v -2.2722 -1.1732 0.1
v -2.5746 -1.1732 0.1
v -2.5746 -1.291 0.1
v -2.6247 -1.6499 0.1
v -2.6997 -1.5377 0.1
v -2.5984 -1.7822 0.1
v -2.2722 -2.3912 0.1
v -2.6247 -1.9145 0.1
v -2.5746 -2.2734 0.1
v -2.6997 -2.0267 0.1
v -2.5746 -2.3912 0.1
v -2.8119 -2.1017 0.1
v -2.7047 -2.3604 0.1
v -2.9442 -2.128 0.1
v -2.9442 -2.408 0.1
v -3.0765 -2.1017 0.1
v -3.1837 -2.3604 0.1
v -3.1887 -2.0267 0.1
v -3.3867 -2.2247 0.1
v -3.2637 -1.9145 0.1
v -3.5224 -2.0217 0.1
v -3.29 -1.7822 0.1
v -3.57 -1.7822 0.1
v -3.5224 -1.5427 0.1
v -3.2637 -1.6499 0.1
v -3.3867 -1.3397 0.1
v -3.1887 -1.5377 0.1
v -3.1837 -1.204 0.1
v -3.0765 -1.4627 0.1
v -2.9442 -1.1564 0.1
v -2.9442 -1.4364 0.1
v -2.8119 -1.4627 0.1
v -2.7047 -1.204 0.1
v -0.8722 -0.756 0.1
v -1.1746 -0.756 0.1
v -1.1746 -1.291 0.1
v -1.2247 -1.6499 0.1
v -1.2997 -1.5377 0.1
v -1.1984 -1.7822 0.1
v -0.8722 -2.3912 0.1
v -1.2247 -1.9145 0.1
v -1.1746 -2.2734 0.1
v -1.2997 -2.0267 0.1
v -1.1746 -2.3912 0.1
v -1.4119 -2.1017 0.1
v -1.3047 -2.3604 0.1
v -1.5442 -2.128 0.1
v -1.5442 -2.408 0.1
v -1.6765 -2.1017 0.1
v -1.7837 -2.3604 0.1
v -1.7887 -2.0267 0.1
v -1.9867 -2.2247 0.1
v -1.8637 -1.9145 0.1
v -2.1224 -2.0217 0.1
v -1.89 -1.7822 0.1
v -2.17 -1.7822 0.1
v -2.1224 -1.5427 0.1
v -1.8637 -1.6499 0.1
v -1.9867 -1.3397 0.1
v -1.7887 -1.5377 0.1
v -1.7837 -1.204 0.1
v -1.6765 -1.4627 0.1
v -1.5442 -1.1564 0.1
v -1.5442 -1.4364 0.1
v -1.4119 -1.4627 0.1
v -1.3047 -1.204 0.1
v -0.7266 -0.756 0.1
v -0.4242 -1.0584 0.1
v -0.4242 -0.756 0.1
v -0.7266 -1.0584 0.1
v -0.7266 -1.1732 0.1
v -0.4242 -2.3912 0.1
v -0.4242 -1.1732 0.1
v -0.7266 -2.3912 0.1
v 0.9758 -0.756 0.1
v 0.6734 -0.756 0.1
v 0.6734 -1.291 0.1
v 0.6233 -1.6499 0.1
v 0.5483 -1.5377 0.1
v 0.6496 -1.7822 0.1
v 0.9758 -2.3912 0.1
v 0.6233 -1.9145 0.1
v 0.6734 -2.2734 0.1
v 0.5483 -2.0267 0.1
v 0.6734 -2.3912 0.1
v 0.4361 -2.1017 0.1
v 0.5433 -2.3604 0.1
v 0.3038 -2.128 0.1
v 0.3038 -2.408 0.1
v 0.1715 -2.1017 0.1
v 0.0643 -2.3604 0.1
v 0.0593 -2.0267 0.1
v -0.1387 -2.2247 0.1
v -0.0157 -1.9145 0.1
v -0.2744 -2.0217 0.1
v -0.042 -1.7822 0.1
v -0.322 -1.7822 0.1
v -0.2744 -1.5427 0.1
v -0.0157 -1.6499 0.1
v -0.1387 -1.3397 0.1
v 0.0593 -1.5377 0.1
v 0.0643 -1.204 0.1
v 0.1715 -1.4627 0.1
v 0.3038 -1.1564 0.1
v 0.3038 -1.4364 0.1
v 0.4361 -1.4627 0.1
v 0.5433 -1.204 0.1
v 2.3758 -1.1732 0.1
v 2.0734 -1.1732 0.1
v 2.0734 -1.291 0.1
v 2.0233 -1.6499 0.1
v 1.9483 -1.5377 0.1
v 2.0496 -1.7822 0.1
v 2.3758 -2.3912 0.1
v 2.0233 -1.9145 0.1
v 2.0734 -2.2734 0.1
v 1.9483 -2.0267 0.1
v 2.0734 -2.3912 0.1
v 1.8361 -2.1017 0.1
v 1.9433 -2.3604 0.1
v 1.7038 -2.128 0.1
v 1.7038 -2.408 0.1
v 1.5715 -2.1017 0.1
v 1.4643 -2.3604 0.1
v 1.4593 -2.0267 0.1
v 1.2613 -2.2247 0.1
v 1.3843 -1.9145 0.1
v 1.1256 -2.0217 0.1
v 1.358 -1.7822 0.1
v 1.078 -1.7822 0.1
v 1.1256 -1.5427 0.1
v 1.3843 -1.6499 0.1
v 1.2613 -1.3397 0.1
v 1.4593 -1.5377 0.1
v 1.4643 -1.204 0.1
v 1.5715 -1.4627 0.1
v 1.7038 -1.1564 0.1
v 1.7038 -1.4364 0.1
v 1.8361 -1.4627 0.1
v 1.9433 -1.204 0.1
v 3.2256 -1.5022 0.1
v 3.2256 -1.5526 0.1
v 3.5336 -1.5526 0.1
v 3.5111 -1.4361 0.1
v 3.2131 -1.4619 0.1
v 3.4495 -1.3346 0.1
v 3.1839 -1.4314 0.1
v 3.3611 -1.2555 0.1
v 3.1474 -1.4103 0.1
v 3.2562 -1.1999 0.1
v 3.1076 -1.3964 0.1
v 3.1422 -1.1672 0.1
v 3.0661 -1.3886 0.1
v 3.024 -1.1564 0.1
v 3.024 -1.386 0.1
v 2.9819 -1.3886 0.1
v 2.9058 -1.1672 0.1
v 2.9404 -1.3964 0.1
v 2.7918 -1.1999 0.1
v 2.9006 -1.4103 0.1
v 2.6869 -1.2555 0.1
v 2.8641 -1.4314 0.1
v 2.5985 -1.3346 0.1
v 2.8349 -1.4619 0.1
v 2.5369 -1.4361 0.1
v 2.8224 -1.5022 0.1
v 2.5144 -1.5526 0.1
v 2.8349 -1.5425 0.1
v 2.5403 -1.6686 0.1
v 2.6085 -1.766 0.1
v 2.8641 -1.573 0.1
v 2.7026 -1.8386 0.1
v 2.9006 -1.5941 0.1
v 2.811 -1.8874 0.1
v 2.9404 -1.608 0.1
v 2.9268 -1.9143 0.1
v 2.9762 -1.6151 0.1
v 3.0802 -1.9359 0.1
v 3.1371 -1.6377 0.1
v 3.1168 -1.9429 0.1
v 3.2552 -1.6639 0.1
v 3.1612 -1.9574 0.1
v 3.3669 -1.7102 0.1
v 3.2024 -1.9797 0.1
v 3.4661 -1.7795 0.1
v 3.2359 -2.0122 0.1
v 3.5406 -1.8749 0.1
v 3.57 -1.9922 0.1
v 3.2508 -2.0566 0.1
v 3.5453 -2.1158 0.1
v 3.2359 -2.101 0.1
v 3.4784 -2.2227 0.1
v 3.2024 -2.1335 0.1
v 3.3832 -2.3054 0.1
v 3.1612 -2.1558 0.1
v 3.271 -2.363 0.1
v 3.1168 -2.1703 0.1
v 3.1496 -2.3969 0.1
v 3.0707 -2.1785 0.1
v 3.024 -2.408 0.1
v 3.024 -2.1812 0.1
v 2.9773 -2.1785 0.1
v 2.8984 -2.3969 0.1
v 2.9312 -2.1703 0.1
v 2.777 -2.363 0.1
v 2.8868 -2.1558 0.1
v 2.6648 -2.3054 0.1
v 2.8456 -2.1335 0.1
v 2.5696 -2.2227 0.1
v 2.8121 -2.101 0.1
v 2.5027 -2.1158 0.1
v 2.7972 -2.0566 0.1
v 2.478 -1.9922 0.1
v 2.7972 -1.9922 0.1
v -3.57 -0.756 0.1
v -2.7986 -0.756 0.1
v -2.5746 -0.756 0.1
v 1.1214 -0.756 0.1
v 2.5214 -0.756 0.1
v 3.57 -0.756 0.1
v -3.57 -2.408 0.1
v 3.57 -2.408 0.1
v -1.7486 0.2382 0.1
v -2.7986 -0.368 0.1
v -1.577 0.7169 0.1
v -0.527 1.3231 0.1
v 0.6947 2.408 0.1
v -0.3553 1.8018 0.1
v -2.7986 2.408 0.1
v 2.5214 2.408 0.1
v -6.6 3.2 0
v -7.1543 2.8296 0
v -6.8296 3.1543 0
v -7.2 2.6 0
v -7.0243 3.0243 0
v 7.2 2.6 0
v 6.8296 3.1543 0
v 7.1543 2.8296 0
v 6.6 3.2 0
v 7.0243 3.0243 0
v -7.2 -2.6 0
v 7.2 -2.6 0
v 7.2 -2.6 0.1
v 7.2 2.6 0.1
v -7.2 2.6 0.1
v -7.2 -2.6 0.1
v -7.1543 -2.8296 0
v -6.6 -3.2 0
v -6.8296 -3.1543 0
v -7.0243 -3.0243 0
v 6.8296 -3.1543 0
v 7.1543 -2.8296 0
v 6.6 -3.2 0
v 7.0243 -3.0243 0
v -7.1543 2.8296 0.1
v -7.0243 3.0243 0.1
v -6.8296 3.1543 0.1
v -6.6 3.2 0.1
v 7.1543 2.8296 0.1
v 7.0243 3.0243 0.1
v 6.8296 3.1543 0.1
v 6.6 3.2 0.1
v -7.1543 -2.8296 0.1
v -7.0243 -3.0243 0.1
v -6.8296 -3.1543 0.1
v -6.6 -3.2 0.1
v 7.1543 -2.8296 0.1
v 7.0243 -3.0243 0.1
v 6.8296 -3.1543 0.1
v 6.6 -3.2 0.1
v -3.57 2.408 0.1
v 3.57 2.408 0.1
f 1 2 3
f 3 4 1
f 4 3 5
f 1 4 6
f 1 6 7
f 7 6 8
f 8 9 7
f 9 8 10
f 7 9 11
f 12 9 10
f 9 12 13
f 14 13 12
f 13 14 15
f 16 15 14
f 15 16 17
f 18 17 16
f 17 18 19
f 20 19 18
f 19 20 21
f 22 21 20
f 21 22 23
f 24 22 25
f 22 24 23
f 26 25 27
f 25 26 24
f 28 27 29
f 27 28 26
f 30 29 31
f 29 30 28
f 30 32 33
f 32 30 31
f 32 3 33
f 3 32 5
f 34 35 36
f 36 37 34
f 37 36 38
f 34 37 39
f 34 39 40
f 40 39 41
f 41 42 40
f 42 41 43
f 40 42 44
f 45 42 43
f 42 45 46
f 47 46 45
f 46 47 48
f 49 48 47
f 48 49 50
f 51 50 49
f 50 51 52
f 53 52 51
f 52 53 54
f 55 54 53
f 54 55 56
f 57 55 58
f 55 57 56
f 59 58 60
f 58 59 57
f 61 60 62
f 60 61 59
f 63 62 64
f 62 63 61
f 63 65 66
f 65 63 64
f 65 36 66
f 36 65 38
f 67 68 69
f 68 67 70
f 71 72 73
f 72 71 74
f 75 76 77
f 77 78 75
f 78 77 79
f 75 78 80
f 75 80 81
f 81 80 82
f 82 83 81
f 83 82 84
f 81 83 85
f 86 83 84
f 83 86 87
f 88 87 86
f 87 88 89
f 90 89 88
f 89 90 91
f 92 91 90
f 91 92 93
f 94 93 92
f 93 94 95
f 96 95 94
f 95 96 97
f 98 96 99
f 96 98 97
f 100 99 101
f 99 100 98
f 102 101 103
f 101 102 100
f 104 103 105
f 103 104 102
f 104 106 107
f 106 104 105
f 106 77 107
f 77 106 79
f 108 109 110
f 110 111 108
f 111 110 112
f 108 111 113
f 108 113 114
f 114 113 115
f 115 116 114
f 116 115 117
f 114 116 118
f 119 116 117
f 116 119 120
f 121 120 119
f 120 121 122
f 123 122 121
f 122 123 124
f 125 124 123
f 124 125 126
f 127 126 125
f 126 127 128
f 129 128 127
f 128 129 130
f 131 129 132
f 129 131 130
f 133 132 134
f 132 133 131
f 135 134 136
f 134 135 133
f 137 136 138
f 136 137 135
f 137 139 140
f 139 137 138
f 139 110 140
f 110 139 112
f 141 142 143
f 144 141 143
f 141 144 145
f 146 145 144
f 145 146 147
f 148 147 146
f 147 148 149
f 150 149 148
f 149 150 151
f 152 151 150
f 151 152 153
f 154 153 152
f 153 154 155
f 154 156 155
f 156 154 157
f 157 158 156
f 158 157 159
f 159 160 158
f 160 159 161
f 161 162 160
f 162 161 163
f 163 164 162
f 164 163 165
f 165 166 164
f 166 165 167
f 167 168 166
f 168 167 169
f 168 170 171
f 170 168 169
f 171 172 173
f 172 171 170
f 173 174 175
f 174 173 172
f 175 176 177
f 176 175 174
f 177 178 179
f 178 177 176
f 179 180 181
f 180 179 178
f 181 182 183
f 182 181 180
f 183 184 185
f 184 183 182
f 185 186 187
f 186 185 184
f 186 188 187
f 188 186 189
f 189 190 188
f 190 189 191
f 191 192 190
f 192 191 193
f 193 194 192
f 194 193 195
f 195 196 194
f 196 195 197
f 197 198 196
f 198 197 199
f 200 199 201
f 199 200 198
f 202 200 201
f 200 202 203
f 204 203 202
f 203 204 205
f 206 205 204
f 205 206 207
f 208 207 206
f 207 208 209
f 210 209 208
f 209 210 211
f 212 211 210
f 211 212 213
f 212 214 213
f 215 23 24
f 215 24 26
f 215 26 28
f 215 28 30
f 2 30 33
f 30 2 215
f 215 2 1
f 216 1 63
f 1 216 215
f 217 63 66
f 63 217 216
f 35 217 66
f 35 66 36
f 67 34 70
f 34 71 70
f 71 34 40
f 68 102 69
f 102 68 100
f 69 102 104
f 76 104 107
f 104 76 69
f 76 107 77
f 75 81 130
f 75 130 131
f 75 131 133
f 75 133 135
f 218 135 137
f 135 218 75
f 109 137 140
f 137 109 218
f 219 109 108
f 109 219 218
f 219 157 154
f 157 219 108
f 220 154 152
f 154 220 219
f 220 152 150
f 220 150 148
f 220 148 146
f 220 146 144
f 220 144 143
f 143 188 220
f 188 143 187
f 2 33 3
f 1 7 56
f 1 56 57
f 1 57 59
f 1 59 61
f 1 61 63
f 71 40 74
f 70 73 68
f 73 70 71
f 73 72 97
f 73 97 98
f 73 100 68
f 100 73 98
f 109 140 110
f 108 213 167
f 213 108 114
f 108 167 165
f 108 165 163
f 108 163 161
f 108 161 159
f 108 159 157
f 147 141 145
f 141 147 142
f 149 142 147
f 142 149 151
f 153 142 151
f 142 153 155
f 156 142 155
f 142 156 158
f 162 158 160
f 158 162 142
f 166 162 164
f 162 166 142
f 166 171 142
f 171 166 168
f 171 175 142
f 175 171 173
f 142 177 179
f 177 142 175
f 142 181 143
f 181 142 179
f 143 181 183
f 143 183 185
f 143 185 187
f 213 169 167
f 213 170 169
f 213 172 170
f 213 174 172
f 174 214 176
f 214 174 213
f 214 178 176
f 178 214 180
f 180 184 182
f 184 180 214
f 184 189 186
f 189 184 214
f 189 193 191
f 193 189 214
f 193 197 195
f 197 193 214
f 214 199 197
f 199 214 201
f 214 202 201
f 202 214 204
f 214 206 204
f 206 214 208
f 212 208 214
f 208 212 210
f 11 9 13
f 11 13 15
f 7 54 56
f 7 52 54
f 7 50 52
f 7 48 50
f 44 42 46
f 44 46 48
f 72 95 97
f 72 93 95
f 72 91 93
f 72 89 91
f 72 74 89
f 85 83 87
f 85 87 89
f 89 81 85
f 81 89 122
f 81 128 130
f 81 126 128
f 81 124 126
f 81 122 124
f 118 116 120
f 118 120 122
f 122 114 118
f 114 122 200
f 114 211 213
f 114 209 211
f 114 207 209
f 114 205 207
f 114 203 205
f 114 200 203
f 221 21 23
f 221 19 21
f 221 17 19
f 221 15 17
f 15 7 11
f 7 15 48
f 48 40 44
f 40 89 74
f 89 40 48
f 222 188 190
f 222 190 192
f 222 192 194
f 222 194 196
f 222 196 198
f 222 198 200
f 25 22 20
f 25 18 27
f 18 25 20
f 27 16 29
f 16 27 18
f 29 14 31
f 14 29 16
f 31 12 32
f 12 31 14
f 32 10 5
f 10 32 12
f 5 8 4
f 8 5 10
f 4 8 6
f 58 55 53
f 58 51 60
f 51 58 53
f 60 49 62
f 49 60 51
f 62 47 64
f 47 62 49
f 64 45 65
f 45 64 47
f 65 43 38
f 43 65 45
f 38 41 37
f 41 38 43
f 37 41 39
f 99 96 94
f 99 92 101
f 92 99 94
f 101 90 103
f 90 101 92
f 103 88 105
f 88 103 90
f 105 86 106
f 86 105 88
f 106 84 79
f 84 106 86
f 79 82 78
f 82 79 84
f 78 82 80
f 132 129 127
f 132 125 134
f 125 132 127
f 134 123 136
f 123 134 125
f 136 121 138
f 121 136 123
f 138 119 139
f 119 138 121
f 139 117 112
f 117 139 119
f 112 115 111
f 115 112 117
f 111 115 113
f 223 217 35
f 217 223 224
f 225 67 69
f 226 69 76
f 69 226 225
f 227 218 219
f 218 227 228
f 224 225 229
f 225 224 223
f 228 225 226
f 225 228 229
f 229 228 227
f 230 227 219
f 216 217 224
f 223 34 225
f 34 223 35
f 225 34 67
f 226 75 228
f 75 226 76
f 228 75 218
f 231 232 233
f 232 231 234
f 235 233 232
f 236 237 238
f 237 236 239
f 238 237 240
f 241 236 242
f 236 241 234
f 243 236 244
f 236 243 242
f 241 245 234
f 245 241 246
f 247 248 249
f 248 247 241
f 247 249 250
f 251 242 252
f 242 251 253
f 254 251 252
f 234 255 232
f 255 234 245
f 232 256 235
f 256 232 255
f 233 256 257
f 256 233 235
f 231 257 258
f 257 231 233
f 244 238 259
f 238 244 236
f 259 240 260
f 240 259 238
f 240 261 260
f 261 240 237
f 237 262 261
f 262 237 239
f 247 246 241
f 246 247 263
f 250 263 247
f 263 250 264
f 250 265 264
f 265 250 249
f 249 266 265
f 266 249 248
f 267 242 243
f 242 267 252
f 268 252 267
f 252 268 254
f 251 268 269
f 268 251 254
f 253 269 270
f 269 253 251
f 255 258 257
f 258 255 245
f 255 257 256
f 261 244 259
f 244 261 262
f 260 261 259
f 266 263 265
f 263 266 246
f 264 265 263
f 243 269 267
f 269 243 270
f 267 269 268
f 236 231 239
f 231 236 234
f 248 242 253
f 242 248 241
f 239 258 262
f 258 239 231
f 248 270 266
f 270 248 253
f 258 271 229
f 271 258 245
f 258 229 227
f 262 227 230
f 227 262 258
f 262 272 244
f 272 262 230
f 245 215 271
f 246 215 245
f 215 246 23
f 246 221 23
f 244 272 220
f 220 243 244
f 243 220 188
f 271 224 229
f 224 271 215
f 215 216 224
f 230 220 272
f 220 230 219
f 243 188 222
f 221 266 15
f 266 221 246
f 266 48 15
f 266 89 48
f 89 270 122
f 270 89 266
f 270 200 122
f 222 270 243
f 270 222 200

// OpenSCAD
// file: ../p/logo-adidas.scad
use <../lib.scad>
function ldraw_lib__logo_adidas() = [
// 0 Logo Adidas Stripes
// 0 Name: logo-adidas.dat
// 0 Author: Massimo Maso [Sirio]
// 0 !LDRAW_ORG Primitive UPDATE 2024-09
// 0 !LICENSE Licensed under CC BY 4.0 : see CAreadme.txt
// 
// 0 !HELP Exact dimensions X = 19; Z = 11.3
// 
// 0 BFC CERTIFY CCW
  [0,"BFC","CERTIFY"],
  [0,"BFC","CCW"],
// 
// 0 !HISTORY 2024-10-27 [OrionP] Official Update 2024-09
// 
// 
// 0 // Faces
// 4 16 -9.5 0 -4.2643 -8.7 0 -5.65 -3.7 0 -5.65 -5.75 0 -2.0993
  [4,16,-9.5,0,-4.2643,-8.7,0,-5.65,-3.7,0,-5.65,-5.75,0,-2.0993],
// 3 16 -5.137 0 -.3897 -2.1 0 -5.65 -1.02 0 -5.65
  [3,16,-5.137,0,-.3897,-2.1,0,-5.65,-1.02,0,-5.65],
// 4 16 -5.137 0 -.3897 -1.02 0 -5.65 2.9 0 -5.65 -1.387 0 1.7754
  [4,16,-5.137,0,-.3897,-1.02,0,-5.65,2.9,0,-5.65,-1.387,0,1.7754],
// 4 16 -.774 0 3.4849 4.5 0 -5.65 9.5 0 -5.65 2.976 0 5.65
  [4,16,-.774,0,3.4849,4.5,0,-5.65,9.5,0,-5.65,2.976,0,5.65],
];
module ldraw_lib__logo_adidas(step=0, col=false, unit=2/5, alt=false, line=0.2, solid=!$preview)
    makepoly(ldraw_lib__logo_adidas(), step=step, col=col, unit=unit, alt=alt, line=line, solid=solid);
ldraw_lib__logo_adidas(line=0.2);
// file: ../p/logo-adidas-box.scad
use <../lib.scad>
function ldraw_lib__logo_adidas_box() = [
// 0 Logo Adidas Stripes - Outer Box
// 0 Name: logo-adidas-box.dat
// 0 Author: Massimo Maso [Sirio]
// 0 !LDRAW_ORG Primitive UPDATE 2024-09
// 0 !LICENSE Licensed under CC BY 4.0 : see CAreadme.txt
// 
// 0 !HELP Exact dimensions X = 19; Z = 11.3
// 
// 0 BFC CERTIFY CCW
  [0,"BFC","CERTIFY"],
  [0,"BFC","CCW"],
// 
// 0 !HISTORY 2024-10-27 [OrionP] Official Update 2024-09
// 
// 
// 0 // Faces
// 4 16 -9.5 0 5.65 -9.5 0 -4.2643 -5.75 0 -2.0993 -5.137 0 -.3897
  [4,16,-9.5,0,5.65,-9.5,0,-4.2643,-5.75,0,-2.0993,-5.137,0,-.3897],
// 4 16 -9.5 0 5.65 -5.137 0 -.3897 -1.387 0 1.7754 -.774 0 3.4849
  [4,16,-9.5,0,5.65,-5.137,0,-.3897,-1.387,0,1.7754,-.774,0,3.4849],
// 3 16 -9.5 0 5.65 -.774 0 3.4849 2.976 0 5.65
  [3,16,-9.5,0,5.65,-.774,0,3.4849,2.976,0,5.65],
// 3 16 9.5 0 5.65 2.976 0 5.65 9.5 0 -5.65
  [3,16,9.5,0,5.65,2.976,0,5.65,9.5,0,-5.65],
// 3 16 -9.5 0 -5.65 -8.7 0 -5.65 -9.5 0 -4.2643
  [3,16,-9.5,0,-5.65,-8.7,0,-5.65,-9.5,0,-4.2643],
// 4 16 -5.137 0 -.3897 -5.75 0 -2.0993 -3.7 0 -5.65 -2.62 0 -5.65
  [4,16,-5.137,0,-.3897,-5.75,0,-2.0993,-3.7,0,-5.65,-2.62,0,-5.65],
// 3 16 -5.137 0 -.3897 -2.62 0 -5.65 -2.1 0 -5.65
  [3,16,-5.137,0,-.3897,-2.62,0,-5.65,-2.1,0,-5.65],
// 4 16 -.774 0 3.4849 -1.387 0 1.7754 2.9 0 -5.65 3.98 0 -5.65
  [4,16,-.774,0,3.4849,-1.387,0,1.7754,2.9,0,-5.65,3.98,0,-5.65],
// 3 16 -.774 0 3.4849 3.98 0 -5.65 4.5 0 -5.65
  [3,16,-.774,0,3.4849,3.98,0,-5.65,4.5,0,-5.65],
];
module ldraw_lib__logo_adidas_box(step=0, col=false, unit=2/5, alt=false, line=0.2, solid=!$preview)
    makepoly(ldraw_lib__logo_adidas_box(), step=step, col=col, unit=unit, alt=alt, line=line, solid=solid);
ldraw_lib__logo_adidas_box(line=0.2);
// file: ../p/box3u12.scad
use <../lib.scad>
function ldraw_lib__box3u12() = [
// 0 Box with 3 Parallel Faces without Any Edges
// 0 Name: box3u12.dat
// 0 Author: J.C. Tchang [tchang]
// 0 !LDRAW_ORG Primitive UPDATE 2014-02
// 0 !LICENSE Licensed under CC BY 4.0 : see CAreadme.txt
// 
// 0 BFC CERTIFY CCW
  [0,"BFC","CERTIFY"],
  [0,"BFC","CCW"],
// 
// 0 !HISTORY 2014-12-23 [PTadmin] Official Update 2014-02
// 
// 
// 4 16 -1 1 1 1 1 1 1 1 -1 -1 1 -1
  [4,16,-1,1,1,1,1,1,1,1,-1,-1,1,-1],
// 4 16 -1 1 1 -1 0 1 1 0 1 1 1 1
  [4,16,-1,1,1,-1,0,1,1,0,1,1,1,1],
// 4 16 1 1 -1 1 0 -1 -1 0 -1 -1 1 -1
  [4,16,1,1,-1,1,0,-1,-1,0,-1,-1,1,-1],
];
module ldraw_lib__box3u12(step=0, col=false, unit=2/5, alt=false, line=0.2, solid=!$preview)
    makepoly(ldraw_lib__box3u12(), step=step, col=col, unit=unit, alt=alt, line=line, solid=solid);
ldraw_lib__box3u12(line=0.2);
// file: ../p/1-4cyli.scad
use <../lib.scad>
function ldraw_lib__1_4cyli() = [
// 0 Cylinder 0.25
// 0 Name: 1-4cyli.dat
// 0 Author: James Jessiman
// 0 !LDRAW_ORG Primitive UPDATE 2012-01
// 0 !LICENSE Licensed under CC BY 4.0 : see CAreadme.txt
// 
// 0 BFC CERTIFY CCW
  [0,"BFC","CERTIFY"],
  [0,"BFC","CCW"],
// 
// 0 !HISTORY 2002-03-23 [sbliss] Added BFC statement.
// 0 !HISTORY 2002-04-25 [PTadmin] Official Update 2002-02
// 0 !HISTORY 2007-06-22 [PTadmin] Header formatted for Contributor Agreement
// 0 !HISTORY 2008-07-01 [PTadmin] Official Update 2008-01
// 0 !HISTORY 2012-02-16 [Philo] Changed to CCW
// 0 !HISTORY 2012-03-30 [PTadmin] Official Update 2012-01
// 
// 
// 4 16 1 1 0 0.9239 1 0.3827 0.9239 0 0.3827 1 0 0
  [4,16,1,1,0,0.9239,1,0.3827,0.9239,0,0.3827,1,0,0],
// 5 24 1 0 0 1 1 0 0.9239 0 0.3827 1 0 -1
  [5,24,1,0,0,1,1,0,0.9239,0,0.3827,1,0,-1],
// 4 16 0.9239 1 0.3827 0.7071 1 0.7071 0.7071 0 0.7071 0.9239 0 0.3827
  [4,16,0.9239,1,0.3827,0.7071,1,0.7071,0.7071,0,0.7071,0.9239,0,0.3827],
// 5 24 0.9239 0 0.3827 0.9239 1 0.3827 0.7071 0 0.7071 1 0 0
  [5,24,0.9239,0,0.3827,0.9239,1,0.3827,0.7071,0,0.7071,1,0,0],
// 4 16 0.7071 1 0.7071 0.3827 1 0.9239 0.3827 0 0.9239 0.7071 0 0.7071
  [4,16,0.7071,1,0.7071,0.3827,1,0.9239,0.3827,0,0.9239,0.7071,0,0.7071],
// 5 24 0.7071 0 0.7071 0.7071 1 0.7071 0.3827 0 0.9239 0.9239 0 0.3827
  [5,24,0.7071,0,0.7071,0.7071,1,0.7071,0.3827,0,0.9239,0.9239,0,0.3827],
// 4 16 0.3827 1 0.9239 0 1 1 0 0 1 0.3827 0 0.9239
  [4,16,0.3827,1,0.9239,0,1,1,0,0,1,0.3827,0,0.9239],
// 5 24 0.3827 0 0.9239 0.3827 1 0.9239 0 0 1 0.7071 0 0.7071
  [5,24,0.3827,0,0.9239,0.3827,1,0.9239,0,0,1,0.7071,0,0.7071],
// 5 24 0 0 1 0 1 1 0.3827 0 0.9239 -1 0 1
  [5,24,0,0,1,0,1,1,0.3827,0,0.9239,-1,0,1],
];
module ldraw_lib__1_4cyli(step=0, col=false, unit=2/5, alt=false, line=0.2, solid=!$preview)
    makepoly(ldraw_lib__1_4cyli(), step=step, col=col, unit=unit, alt=alt, line=line, solid=solid);
ldraw_lib__1_4cyli(line=0.2);
// file: ../p/1-4chrd.scad
use <../lib.scad>
function ldraw_lib__1_4chrd() = [
// 0 Chord 0.25
// 0 Name: 1-4chrd.dat
// 0 Author: Max Martin Richter [MMR1988]
// 0 !LDRAW_ORG Primitive UPDATE 2023-05
// 0 !LICENSE Licensed under CC BY 4.0 : see CAreadme.txt
// 
// 0 BFC CERTIFY CCW
  [0,"BFC","CERTIFY"],
  [0,"BFC","CCW"],
// 
// 0 !HISTORY 2004-04-22 [PTadmin] Official Update 2004-02
// 0 !HISTORY 2007-10-09 [PTadmin] Header formatted for Contributor Agreement
// 0 !HISTORY 2008-07-01 [PTadmin] Official Update 2008-01
// 0 !HISTORY 2012-08-02 [MMR1988] Re-creation with PrimGen2 and Rectifier
// 0 !HISTORY 2012-08-09 [PTadmin] Official Update 2012-02
// 0 !HISTORY 2023-10-27 [OrionP] Change author to MMR1988 from hafhead
// 0 !HISTORY 2023-10-31 [OrionP] Official Update 2023-05
// 
// 4 16 0.9239 0 0.3827 0.3827 0 0.9239 0 0 1 1 0 0
  [4,16,0.9239,0,0.3827,0.3827,0,0.9239,0,0,1,1,0,0],
// 3 16 0.7071 0 0.7071 0.3827 0 0.9239 0.9239 0 0.3827
  [3,16,0.7071,0,0.7071,0.3827,0,0.9239,0.9239,0,0.3827],
];
module ldraw_lib__1_4chrd(step=0, col=false, unit=2/5, alt=false, line=0.2, solid=!$preview)
    makepoly(ldraw_lib__1_4chrd(), step=step, col=col, unit=unit, alt=alt, line=line, solid=solid);
ldraw_lib__1_4chrd(line=0.2);
// main file
use <../lib.scad>
use <../p/1-4chrd.scad>
use <../p/1-4cyli.scad>
use <../p/box3u12.scad>
use <../p/logo-adidas-box.scad>
use <../p/logo-adidas-text-box.scad>
use <../p/logo-adidas-text.scad>
use <../p/logo-adidas.scad>
function ldraw_lib__6148328bb() = [
// 0 Sticker  0.8 x  1.8 with White Adidas Logo on Black Background
// 0 Name: 6148328bb.dat
// 0 Author: Massimo Maso [Sirio]
// 0 !LDRAW_ORG Part UPDATE 2024-09
// 0 !LICENSE Licensed under CC BY 4.0 : see CAreadme.txt
// 
// 0 BFC CERTIFY CCW
  [0,"BFC","CERTIFY"],
  [0,"BFC","CCW"],
// 
// 0 !KEYWORDS 919, Bricklink 75876stk01, Brickowl 852010, Hybrid, Pit Lane
// 0 !KEYWORDS Rebrickable 26357, set 75876, Speed Champions
// 
// 0 !HISTORY 2024-10-27 [OrionP] Official Update 2024-09
// 
// 0 // Logo primitive
// 1 15 0 -.25 -3.955 .7 0 0 0 1 0 0 0 .7 logo-adidas-text.dat
  [1,15,0,-.25,-3.955,.7,0,0,0,1,0,0,0,.7, ldraw_lib__logo_adidas_text()],
// 1 0 0 -.25 -3.955 .7 0 0 0 1 0 0 0 .7 logo-adidas-text-box.dat
  [1,0,0,-.25,-3.955,.7,0,0,0,1,0,0,0,.7, ldraw_lib__logo_adidas_text_box()],
// 1 15 -.3465 -.25 2.065 .7 0 0 0 1 0 0 0 .7 logo-adidas.dat
  [1,15,-.3465,-.25,2.065,.7,0,0,0,1,0,0,0,.7, ldraw_lib__logo_adidas()],
// 1 0 -.3465 -.25 2.065 .7 0 0 0 1 0 0 0 .7 logo-adidas-box.dat
  [1,0,-.3465,-.25,2.065,.7,0,0,0,1,0,0,0,.7, ldraw_lib__logo_adidas_box()],
// 0 // Primitives
// 1 16 -16.5 0 6.5 -1.5 0 0 0 -1 0 0 0 1.5 1-4chrd.dat
  [1,16,-16.5,0,6.5,-1.5,0,0,0,-1,0,0,0,1.5, ldraw_lib__1_4chrd()],
// 1 16 16.5 0 6.5 1.5 0 0 0 -1 0 0 0 1.5 1-4chrd.dat
  [1,16,16.5,0,6.5,1.5,0,0,0,-1,0,0,0,1.5, ldraw_lib__1_4chrd()],
// 1 16 0 -.25 0 0 0 18 0 .25 0 6.5 0 0 box3u12.dat
  [1,16,0,-.25,0,0,0,18,0,.25,0,6.5,0,0, ldraw_lib__box3u12()],
// 1 16 -16.5 0 -6.5 -1.5 0 0 0 -1 0 0 0 -1.5 1-4chrd.dat
  [1,16,-16.5,0,-6.5,-1.5,0,0,0,-1,0,0,0,-1.5, ldraw_lib__1_4chrd()],
// 1 16 16.5 0 -6.5 1.5 0 0 0 -1 0 0 0 -1.5 1-4chrd.dat
  [1,16,16.5,0,-6.5,1.5,0,0,0,-1,0,0,0,-1.5, ldraw_lib__1_4chrd()],
// 1 16 -16.5 0 6.5 -1.5 0 0 0 -.25 0 0 0 1.5 1-4cyli.dat
  [1,16,-16.5,0,6.5,-1.5,0,0,0,-.25,0,0,0,1.5, ldraw_lib__1_4cyli()],
// 1 16 16.5 0 6.5 1.5 0 0 0 -.25 0 0 0 1.5 1-4cyli.dat
  [1,16,16.5,0,6.5,1.5,0,0,0,-.25,0,0,0,1.5, ldraw_lib__1_4cyli()],
// 1 16 -16.5 0 -6.5 -1.5 0 0 0 -.25 0 0 0 -1.5 1-4cyli.dat
  [1,16,-16.5,0,-6.5,-1.5,0,0,0,-.25,0,0,0,-1.5, ldraw_lib__1_4cyli()],
// 1 16 16.5 0 -6.5 1.5 0 0 0 -.25 0 0 0 -1.5 1-4cyli.dat
  [1,16,16.5,0,-6.5,1.5,0,0,0,-.25,0,0,0,-1.5, ldraw_lib__1_4cyli()],
// 1 0 -16.5 -.25 6.5 -1.5 0 0 0 1 0 0 0 1.5 1-4chrd.dat
  [1,0,-16.5,-.25,6.5,-1.5,0,0,0,1,0,0,0,1.5, ldraw_lib__1_4chrd()],
// 1 0 16.5 -.25 6.5 1.5 0 0 0 1 0 0 0 1.5 1-4chrd.dat
  [1,0,16.5,-.25,6.5,1.5,0,0,0,1,0,0,0,1.5, ldraw_lib__1_4chrd()],
// 1 0 -16.5 -.25 -6.5 -1.5 0 0 0 1 0 0 0 -1.5 1-4chrd.dat
  [1,0,-16.5,-.25,-6.5,-1.5,0,0,0,1,0,0,0,-1.5, ldraw_lib__1_4chrd()],
// 1 0 16.5 -.25 -6.5 1.5 0 0 0 1 0 0 0 -1.5 1-4chrd.dat
  [1,0,16.5,-.25,-6.5,1.5,0,0,0,1,0,0,0,-1.5, ldraw_lib__1_4chrd()],
// 0 // Bottom faces
// 4 16 16.5 0 8 18 0 6.5 -18 0 6.5 -16.5 0 8
  [4,16,16.5,0,8,18,0,6.5,-18,0,6.5,-16.5,0,8],
// 4 16 16.5 0 -8 -16.5 0 -8 -18 0 -6.5 18 0 -6.5
  [4,16,16.5,0,-8,-16.5,0,-8,-18,0,-6.5,18,0,-6.5],
// 0 // Lateral faces
// 4 16 -16.5 0 8 -16.5 -.25 8 16.5 -.25 8 16.5 0 8
  [4,16,-16.5,0,8,-16.5,-.25,8,16.5,-.25,8,16.5,0,8],
// 4 16 -16.5 0 -8 16.5 0 -8 16.5 -.25 -8 -16.5 -.25 -8
  [4,16,-16.5,0,-8,16.5,0,-8,16.5,-.25,-8,-16.5,-.25,-8],
// 0 // Top faces
// 4 0 -16.5 -.25 8 -18 -.25 6.5 -8.925 -.25 6.02 -6.9965 -.25 6.02
  [4,0,-16.5,-.25,8,-18,-.25,6.5,-8.925,-.25,6.02,-6.9965,-.25,6.02],
// 3 0 -16.5 -.25 8 -6.9965 -.25 6.02 1.7367 -.25 6.02
  [3,0,-16.5,-.25,8,-6.9965,-.25,6.02,1.7367,-.25,6.02],
// 4 0 -16.5 -.25 8 1.7367 -.25 6.02 6.3035 -.25 6.02 16.5 -.25 8
  [4,0,-16.5,-.25,8,1.7367,-.25,6.02,6.3035,-.25,6.02,16.5,-.25,8],
// 4 0 16.5 -.25 8 6.3035 -.25 6.02 8.925 -.25 6.02 18 -.25 6.5
  [4,0,16.5,-.25,8,6.3035,-.25,6.02,8.925,-.25,6.02,18,-.25,6.5],
// 3 0 -18 -.25 6.5 -8.925 -.25 -1.89 -8.925 -.25 6.02
  [3,0,-18,-.25,6.5,-8.925,-.25,-1.89,-8.925,-.25,6.02],
// 4 0 -18 -.25 6.5 -18 -.25 -6.5 -8.925 -.25 -4.4555 -8.925 -.25 -1.89
  [4,0,-18,-.25,6.5,-18,-.25,-6.5,-8.925,-.25,-4.4555,-8.925,-.25,-1.89],
// 3 0 -18 -.25 -6.5 -8.925 -.25 -6.02 -8.925 -.25 -4.4555
  [3,0,-18,-.25,-6.5,-8.925,-.25,-6.02,-8.925,-.25,-4.4555],
// 3 0 18 -.25 6.5 8.925 -.25 6.02 8.925 -.25 -1.89
  [3,0,18,-.25,6.5,8.925,-.25,6.02,8.925,-.25,-1.89],
// 4 0 18 -.25 6.5 8.925 -.25 -1.89 8.925 -.25 -4.9805 18 -.25 -6.5
  [4,0,18,-.25,6.5,8.925,-.25,-1.89,8.925,-.25,-4.9805,18,-.25,-6.5],
// 4 0 -8.925 -.25 -1.89 -6.9965 -.25 -.92001 -6.9965 -.25 6.02 -8.925 -.25 6.02
  [4,0,-8.925,-.25,-1.89,-6.9965,-.25,-.92001,-6.9965,-.25,6.02,-8.925,-.25,6.02],
// 3 0 -8.925 -.25 -1.89 -6.9965 -.25 -1.89 -6.9965 -.25 -.92001
  [3,0,-8.925,-.25,-1.89,-6.9965,-.25,-1.89,-6.9965,-.25,-.92001],
// 4 0 8.925 -.25 -1.89 8.925 -.25 6.02 6.3035 -.25 6.02 6.3035 -.25 -1.89
  [4,0,8.925,-.25,-1.89,8.925,-.25,6.02,6.3035,-.25,6.02,6.3035,-.25,-1.89],
// 3 0 18 -.25 -6.5 8.925 -.25 -4.9805 8.925 -.25 -6.02
  [3,0,18,-.25,-6.5,8.925,-.25,-4.9805,8.925,-.25,-6.02],
// 4 0 -16.5 -.25 -8 -7.3605 -.25 -6.02 -8.925 -.25 -6.02 -18 -.25 -6.5
  [4,0,-16.5,-.25,-8,-7.3605,-.25,-6.02,-8.925,-.25,-6.02,-18,-.25,-6.5],
// 3 0 -16.5 -.25 -8 -3.8605 -.25 -6.02 -7.3605 -.25 -6.02
  [3,0,-16.5,-.25,-8,-3.8605,-.25,-6.02,-7.3605,-.25,-6.02],
// 3 0 -16.5 -.25 -8 .7595 -.25 -6.02 -3.8605 -.25 -6.02
  [3,0,-16.5,-.25,-8,.7595,-.25,-6.02,-3.8605,-.25,-6.02],
// 4 0 -16.5 -.25 -8 16.5 -.25 -8 4.2595 -.25 -6.02 .7595 -.25 -6.02
  [4,0,-16.5,-.25,-8,16.5,-.25,-8,4.2595,-.25,-6.02,.7595,-.25,-6.02],
// 3 0 16.5 -.25 -8 7.56 -.25 -6.02 4.2595 -.25 -6.02
  [3,0,16.5,-.25,-8,7.56,-.25,-6.02,4.2595,-.25,-6.02],
// 4 0 16.5 -.25 -8 18 -.25 -6.5 8.925 -.25 -6.02 7.56 -.25 -6.02
  [4,0,16.5,-.25,-8,18,-.25,-6.5,8.925,-.25,-6.02,7.56,-.25,-6.02],
];
module ldraw_lib__6148328bb(step=0, col=false, unit=2/5, alt=false, line=0.2, solid=!$preview)
    makepoly(ldraw_lib__6148328bb(), step=step, col=col, unit=unit, alt=alt, line=line, solid=solid);
ldraw_lib__6148328bb(line=0.2);
